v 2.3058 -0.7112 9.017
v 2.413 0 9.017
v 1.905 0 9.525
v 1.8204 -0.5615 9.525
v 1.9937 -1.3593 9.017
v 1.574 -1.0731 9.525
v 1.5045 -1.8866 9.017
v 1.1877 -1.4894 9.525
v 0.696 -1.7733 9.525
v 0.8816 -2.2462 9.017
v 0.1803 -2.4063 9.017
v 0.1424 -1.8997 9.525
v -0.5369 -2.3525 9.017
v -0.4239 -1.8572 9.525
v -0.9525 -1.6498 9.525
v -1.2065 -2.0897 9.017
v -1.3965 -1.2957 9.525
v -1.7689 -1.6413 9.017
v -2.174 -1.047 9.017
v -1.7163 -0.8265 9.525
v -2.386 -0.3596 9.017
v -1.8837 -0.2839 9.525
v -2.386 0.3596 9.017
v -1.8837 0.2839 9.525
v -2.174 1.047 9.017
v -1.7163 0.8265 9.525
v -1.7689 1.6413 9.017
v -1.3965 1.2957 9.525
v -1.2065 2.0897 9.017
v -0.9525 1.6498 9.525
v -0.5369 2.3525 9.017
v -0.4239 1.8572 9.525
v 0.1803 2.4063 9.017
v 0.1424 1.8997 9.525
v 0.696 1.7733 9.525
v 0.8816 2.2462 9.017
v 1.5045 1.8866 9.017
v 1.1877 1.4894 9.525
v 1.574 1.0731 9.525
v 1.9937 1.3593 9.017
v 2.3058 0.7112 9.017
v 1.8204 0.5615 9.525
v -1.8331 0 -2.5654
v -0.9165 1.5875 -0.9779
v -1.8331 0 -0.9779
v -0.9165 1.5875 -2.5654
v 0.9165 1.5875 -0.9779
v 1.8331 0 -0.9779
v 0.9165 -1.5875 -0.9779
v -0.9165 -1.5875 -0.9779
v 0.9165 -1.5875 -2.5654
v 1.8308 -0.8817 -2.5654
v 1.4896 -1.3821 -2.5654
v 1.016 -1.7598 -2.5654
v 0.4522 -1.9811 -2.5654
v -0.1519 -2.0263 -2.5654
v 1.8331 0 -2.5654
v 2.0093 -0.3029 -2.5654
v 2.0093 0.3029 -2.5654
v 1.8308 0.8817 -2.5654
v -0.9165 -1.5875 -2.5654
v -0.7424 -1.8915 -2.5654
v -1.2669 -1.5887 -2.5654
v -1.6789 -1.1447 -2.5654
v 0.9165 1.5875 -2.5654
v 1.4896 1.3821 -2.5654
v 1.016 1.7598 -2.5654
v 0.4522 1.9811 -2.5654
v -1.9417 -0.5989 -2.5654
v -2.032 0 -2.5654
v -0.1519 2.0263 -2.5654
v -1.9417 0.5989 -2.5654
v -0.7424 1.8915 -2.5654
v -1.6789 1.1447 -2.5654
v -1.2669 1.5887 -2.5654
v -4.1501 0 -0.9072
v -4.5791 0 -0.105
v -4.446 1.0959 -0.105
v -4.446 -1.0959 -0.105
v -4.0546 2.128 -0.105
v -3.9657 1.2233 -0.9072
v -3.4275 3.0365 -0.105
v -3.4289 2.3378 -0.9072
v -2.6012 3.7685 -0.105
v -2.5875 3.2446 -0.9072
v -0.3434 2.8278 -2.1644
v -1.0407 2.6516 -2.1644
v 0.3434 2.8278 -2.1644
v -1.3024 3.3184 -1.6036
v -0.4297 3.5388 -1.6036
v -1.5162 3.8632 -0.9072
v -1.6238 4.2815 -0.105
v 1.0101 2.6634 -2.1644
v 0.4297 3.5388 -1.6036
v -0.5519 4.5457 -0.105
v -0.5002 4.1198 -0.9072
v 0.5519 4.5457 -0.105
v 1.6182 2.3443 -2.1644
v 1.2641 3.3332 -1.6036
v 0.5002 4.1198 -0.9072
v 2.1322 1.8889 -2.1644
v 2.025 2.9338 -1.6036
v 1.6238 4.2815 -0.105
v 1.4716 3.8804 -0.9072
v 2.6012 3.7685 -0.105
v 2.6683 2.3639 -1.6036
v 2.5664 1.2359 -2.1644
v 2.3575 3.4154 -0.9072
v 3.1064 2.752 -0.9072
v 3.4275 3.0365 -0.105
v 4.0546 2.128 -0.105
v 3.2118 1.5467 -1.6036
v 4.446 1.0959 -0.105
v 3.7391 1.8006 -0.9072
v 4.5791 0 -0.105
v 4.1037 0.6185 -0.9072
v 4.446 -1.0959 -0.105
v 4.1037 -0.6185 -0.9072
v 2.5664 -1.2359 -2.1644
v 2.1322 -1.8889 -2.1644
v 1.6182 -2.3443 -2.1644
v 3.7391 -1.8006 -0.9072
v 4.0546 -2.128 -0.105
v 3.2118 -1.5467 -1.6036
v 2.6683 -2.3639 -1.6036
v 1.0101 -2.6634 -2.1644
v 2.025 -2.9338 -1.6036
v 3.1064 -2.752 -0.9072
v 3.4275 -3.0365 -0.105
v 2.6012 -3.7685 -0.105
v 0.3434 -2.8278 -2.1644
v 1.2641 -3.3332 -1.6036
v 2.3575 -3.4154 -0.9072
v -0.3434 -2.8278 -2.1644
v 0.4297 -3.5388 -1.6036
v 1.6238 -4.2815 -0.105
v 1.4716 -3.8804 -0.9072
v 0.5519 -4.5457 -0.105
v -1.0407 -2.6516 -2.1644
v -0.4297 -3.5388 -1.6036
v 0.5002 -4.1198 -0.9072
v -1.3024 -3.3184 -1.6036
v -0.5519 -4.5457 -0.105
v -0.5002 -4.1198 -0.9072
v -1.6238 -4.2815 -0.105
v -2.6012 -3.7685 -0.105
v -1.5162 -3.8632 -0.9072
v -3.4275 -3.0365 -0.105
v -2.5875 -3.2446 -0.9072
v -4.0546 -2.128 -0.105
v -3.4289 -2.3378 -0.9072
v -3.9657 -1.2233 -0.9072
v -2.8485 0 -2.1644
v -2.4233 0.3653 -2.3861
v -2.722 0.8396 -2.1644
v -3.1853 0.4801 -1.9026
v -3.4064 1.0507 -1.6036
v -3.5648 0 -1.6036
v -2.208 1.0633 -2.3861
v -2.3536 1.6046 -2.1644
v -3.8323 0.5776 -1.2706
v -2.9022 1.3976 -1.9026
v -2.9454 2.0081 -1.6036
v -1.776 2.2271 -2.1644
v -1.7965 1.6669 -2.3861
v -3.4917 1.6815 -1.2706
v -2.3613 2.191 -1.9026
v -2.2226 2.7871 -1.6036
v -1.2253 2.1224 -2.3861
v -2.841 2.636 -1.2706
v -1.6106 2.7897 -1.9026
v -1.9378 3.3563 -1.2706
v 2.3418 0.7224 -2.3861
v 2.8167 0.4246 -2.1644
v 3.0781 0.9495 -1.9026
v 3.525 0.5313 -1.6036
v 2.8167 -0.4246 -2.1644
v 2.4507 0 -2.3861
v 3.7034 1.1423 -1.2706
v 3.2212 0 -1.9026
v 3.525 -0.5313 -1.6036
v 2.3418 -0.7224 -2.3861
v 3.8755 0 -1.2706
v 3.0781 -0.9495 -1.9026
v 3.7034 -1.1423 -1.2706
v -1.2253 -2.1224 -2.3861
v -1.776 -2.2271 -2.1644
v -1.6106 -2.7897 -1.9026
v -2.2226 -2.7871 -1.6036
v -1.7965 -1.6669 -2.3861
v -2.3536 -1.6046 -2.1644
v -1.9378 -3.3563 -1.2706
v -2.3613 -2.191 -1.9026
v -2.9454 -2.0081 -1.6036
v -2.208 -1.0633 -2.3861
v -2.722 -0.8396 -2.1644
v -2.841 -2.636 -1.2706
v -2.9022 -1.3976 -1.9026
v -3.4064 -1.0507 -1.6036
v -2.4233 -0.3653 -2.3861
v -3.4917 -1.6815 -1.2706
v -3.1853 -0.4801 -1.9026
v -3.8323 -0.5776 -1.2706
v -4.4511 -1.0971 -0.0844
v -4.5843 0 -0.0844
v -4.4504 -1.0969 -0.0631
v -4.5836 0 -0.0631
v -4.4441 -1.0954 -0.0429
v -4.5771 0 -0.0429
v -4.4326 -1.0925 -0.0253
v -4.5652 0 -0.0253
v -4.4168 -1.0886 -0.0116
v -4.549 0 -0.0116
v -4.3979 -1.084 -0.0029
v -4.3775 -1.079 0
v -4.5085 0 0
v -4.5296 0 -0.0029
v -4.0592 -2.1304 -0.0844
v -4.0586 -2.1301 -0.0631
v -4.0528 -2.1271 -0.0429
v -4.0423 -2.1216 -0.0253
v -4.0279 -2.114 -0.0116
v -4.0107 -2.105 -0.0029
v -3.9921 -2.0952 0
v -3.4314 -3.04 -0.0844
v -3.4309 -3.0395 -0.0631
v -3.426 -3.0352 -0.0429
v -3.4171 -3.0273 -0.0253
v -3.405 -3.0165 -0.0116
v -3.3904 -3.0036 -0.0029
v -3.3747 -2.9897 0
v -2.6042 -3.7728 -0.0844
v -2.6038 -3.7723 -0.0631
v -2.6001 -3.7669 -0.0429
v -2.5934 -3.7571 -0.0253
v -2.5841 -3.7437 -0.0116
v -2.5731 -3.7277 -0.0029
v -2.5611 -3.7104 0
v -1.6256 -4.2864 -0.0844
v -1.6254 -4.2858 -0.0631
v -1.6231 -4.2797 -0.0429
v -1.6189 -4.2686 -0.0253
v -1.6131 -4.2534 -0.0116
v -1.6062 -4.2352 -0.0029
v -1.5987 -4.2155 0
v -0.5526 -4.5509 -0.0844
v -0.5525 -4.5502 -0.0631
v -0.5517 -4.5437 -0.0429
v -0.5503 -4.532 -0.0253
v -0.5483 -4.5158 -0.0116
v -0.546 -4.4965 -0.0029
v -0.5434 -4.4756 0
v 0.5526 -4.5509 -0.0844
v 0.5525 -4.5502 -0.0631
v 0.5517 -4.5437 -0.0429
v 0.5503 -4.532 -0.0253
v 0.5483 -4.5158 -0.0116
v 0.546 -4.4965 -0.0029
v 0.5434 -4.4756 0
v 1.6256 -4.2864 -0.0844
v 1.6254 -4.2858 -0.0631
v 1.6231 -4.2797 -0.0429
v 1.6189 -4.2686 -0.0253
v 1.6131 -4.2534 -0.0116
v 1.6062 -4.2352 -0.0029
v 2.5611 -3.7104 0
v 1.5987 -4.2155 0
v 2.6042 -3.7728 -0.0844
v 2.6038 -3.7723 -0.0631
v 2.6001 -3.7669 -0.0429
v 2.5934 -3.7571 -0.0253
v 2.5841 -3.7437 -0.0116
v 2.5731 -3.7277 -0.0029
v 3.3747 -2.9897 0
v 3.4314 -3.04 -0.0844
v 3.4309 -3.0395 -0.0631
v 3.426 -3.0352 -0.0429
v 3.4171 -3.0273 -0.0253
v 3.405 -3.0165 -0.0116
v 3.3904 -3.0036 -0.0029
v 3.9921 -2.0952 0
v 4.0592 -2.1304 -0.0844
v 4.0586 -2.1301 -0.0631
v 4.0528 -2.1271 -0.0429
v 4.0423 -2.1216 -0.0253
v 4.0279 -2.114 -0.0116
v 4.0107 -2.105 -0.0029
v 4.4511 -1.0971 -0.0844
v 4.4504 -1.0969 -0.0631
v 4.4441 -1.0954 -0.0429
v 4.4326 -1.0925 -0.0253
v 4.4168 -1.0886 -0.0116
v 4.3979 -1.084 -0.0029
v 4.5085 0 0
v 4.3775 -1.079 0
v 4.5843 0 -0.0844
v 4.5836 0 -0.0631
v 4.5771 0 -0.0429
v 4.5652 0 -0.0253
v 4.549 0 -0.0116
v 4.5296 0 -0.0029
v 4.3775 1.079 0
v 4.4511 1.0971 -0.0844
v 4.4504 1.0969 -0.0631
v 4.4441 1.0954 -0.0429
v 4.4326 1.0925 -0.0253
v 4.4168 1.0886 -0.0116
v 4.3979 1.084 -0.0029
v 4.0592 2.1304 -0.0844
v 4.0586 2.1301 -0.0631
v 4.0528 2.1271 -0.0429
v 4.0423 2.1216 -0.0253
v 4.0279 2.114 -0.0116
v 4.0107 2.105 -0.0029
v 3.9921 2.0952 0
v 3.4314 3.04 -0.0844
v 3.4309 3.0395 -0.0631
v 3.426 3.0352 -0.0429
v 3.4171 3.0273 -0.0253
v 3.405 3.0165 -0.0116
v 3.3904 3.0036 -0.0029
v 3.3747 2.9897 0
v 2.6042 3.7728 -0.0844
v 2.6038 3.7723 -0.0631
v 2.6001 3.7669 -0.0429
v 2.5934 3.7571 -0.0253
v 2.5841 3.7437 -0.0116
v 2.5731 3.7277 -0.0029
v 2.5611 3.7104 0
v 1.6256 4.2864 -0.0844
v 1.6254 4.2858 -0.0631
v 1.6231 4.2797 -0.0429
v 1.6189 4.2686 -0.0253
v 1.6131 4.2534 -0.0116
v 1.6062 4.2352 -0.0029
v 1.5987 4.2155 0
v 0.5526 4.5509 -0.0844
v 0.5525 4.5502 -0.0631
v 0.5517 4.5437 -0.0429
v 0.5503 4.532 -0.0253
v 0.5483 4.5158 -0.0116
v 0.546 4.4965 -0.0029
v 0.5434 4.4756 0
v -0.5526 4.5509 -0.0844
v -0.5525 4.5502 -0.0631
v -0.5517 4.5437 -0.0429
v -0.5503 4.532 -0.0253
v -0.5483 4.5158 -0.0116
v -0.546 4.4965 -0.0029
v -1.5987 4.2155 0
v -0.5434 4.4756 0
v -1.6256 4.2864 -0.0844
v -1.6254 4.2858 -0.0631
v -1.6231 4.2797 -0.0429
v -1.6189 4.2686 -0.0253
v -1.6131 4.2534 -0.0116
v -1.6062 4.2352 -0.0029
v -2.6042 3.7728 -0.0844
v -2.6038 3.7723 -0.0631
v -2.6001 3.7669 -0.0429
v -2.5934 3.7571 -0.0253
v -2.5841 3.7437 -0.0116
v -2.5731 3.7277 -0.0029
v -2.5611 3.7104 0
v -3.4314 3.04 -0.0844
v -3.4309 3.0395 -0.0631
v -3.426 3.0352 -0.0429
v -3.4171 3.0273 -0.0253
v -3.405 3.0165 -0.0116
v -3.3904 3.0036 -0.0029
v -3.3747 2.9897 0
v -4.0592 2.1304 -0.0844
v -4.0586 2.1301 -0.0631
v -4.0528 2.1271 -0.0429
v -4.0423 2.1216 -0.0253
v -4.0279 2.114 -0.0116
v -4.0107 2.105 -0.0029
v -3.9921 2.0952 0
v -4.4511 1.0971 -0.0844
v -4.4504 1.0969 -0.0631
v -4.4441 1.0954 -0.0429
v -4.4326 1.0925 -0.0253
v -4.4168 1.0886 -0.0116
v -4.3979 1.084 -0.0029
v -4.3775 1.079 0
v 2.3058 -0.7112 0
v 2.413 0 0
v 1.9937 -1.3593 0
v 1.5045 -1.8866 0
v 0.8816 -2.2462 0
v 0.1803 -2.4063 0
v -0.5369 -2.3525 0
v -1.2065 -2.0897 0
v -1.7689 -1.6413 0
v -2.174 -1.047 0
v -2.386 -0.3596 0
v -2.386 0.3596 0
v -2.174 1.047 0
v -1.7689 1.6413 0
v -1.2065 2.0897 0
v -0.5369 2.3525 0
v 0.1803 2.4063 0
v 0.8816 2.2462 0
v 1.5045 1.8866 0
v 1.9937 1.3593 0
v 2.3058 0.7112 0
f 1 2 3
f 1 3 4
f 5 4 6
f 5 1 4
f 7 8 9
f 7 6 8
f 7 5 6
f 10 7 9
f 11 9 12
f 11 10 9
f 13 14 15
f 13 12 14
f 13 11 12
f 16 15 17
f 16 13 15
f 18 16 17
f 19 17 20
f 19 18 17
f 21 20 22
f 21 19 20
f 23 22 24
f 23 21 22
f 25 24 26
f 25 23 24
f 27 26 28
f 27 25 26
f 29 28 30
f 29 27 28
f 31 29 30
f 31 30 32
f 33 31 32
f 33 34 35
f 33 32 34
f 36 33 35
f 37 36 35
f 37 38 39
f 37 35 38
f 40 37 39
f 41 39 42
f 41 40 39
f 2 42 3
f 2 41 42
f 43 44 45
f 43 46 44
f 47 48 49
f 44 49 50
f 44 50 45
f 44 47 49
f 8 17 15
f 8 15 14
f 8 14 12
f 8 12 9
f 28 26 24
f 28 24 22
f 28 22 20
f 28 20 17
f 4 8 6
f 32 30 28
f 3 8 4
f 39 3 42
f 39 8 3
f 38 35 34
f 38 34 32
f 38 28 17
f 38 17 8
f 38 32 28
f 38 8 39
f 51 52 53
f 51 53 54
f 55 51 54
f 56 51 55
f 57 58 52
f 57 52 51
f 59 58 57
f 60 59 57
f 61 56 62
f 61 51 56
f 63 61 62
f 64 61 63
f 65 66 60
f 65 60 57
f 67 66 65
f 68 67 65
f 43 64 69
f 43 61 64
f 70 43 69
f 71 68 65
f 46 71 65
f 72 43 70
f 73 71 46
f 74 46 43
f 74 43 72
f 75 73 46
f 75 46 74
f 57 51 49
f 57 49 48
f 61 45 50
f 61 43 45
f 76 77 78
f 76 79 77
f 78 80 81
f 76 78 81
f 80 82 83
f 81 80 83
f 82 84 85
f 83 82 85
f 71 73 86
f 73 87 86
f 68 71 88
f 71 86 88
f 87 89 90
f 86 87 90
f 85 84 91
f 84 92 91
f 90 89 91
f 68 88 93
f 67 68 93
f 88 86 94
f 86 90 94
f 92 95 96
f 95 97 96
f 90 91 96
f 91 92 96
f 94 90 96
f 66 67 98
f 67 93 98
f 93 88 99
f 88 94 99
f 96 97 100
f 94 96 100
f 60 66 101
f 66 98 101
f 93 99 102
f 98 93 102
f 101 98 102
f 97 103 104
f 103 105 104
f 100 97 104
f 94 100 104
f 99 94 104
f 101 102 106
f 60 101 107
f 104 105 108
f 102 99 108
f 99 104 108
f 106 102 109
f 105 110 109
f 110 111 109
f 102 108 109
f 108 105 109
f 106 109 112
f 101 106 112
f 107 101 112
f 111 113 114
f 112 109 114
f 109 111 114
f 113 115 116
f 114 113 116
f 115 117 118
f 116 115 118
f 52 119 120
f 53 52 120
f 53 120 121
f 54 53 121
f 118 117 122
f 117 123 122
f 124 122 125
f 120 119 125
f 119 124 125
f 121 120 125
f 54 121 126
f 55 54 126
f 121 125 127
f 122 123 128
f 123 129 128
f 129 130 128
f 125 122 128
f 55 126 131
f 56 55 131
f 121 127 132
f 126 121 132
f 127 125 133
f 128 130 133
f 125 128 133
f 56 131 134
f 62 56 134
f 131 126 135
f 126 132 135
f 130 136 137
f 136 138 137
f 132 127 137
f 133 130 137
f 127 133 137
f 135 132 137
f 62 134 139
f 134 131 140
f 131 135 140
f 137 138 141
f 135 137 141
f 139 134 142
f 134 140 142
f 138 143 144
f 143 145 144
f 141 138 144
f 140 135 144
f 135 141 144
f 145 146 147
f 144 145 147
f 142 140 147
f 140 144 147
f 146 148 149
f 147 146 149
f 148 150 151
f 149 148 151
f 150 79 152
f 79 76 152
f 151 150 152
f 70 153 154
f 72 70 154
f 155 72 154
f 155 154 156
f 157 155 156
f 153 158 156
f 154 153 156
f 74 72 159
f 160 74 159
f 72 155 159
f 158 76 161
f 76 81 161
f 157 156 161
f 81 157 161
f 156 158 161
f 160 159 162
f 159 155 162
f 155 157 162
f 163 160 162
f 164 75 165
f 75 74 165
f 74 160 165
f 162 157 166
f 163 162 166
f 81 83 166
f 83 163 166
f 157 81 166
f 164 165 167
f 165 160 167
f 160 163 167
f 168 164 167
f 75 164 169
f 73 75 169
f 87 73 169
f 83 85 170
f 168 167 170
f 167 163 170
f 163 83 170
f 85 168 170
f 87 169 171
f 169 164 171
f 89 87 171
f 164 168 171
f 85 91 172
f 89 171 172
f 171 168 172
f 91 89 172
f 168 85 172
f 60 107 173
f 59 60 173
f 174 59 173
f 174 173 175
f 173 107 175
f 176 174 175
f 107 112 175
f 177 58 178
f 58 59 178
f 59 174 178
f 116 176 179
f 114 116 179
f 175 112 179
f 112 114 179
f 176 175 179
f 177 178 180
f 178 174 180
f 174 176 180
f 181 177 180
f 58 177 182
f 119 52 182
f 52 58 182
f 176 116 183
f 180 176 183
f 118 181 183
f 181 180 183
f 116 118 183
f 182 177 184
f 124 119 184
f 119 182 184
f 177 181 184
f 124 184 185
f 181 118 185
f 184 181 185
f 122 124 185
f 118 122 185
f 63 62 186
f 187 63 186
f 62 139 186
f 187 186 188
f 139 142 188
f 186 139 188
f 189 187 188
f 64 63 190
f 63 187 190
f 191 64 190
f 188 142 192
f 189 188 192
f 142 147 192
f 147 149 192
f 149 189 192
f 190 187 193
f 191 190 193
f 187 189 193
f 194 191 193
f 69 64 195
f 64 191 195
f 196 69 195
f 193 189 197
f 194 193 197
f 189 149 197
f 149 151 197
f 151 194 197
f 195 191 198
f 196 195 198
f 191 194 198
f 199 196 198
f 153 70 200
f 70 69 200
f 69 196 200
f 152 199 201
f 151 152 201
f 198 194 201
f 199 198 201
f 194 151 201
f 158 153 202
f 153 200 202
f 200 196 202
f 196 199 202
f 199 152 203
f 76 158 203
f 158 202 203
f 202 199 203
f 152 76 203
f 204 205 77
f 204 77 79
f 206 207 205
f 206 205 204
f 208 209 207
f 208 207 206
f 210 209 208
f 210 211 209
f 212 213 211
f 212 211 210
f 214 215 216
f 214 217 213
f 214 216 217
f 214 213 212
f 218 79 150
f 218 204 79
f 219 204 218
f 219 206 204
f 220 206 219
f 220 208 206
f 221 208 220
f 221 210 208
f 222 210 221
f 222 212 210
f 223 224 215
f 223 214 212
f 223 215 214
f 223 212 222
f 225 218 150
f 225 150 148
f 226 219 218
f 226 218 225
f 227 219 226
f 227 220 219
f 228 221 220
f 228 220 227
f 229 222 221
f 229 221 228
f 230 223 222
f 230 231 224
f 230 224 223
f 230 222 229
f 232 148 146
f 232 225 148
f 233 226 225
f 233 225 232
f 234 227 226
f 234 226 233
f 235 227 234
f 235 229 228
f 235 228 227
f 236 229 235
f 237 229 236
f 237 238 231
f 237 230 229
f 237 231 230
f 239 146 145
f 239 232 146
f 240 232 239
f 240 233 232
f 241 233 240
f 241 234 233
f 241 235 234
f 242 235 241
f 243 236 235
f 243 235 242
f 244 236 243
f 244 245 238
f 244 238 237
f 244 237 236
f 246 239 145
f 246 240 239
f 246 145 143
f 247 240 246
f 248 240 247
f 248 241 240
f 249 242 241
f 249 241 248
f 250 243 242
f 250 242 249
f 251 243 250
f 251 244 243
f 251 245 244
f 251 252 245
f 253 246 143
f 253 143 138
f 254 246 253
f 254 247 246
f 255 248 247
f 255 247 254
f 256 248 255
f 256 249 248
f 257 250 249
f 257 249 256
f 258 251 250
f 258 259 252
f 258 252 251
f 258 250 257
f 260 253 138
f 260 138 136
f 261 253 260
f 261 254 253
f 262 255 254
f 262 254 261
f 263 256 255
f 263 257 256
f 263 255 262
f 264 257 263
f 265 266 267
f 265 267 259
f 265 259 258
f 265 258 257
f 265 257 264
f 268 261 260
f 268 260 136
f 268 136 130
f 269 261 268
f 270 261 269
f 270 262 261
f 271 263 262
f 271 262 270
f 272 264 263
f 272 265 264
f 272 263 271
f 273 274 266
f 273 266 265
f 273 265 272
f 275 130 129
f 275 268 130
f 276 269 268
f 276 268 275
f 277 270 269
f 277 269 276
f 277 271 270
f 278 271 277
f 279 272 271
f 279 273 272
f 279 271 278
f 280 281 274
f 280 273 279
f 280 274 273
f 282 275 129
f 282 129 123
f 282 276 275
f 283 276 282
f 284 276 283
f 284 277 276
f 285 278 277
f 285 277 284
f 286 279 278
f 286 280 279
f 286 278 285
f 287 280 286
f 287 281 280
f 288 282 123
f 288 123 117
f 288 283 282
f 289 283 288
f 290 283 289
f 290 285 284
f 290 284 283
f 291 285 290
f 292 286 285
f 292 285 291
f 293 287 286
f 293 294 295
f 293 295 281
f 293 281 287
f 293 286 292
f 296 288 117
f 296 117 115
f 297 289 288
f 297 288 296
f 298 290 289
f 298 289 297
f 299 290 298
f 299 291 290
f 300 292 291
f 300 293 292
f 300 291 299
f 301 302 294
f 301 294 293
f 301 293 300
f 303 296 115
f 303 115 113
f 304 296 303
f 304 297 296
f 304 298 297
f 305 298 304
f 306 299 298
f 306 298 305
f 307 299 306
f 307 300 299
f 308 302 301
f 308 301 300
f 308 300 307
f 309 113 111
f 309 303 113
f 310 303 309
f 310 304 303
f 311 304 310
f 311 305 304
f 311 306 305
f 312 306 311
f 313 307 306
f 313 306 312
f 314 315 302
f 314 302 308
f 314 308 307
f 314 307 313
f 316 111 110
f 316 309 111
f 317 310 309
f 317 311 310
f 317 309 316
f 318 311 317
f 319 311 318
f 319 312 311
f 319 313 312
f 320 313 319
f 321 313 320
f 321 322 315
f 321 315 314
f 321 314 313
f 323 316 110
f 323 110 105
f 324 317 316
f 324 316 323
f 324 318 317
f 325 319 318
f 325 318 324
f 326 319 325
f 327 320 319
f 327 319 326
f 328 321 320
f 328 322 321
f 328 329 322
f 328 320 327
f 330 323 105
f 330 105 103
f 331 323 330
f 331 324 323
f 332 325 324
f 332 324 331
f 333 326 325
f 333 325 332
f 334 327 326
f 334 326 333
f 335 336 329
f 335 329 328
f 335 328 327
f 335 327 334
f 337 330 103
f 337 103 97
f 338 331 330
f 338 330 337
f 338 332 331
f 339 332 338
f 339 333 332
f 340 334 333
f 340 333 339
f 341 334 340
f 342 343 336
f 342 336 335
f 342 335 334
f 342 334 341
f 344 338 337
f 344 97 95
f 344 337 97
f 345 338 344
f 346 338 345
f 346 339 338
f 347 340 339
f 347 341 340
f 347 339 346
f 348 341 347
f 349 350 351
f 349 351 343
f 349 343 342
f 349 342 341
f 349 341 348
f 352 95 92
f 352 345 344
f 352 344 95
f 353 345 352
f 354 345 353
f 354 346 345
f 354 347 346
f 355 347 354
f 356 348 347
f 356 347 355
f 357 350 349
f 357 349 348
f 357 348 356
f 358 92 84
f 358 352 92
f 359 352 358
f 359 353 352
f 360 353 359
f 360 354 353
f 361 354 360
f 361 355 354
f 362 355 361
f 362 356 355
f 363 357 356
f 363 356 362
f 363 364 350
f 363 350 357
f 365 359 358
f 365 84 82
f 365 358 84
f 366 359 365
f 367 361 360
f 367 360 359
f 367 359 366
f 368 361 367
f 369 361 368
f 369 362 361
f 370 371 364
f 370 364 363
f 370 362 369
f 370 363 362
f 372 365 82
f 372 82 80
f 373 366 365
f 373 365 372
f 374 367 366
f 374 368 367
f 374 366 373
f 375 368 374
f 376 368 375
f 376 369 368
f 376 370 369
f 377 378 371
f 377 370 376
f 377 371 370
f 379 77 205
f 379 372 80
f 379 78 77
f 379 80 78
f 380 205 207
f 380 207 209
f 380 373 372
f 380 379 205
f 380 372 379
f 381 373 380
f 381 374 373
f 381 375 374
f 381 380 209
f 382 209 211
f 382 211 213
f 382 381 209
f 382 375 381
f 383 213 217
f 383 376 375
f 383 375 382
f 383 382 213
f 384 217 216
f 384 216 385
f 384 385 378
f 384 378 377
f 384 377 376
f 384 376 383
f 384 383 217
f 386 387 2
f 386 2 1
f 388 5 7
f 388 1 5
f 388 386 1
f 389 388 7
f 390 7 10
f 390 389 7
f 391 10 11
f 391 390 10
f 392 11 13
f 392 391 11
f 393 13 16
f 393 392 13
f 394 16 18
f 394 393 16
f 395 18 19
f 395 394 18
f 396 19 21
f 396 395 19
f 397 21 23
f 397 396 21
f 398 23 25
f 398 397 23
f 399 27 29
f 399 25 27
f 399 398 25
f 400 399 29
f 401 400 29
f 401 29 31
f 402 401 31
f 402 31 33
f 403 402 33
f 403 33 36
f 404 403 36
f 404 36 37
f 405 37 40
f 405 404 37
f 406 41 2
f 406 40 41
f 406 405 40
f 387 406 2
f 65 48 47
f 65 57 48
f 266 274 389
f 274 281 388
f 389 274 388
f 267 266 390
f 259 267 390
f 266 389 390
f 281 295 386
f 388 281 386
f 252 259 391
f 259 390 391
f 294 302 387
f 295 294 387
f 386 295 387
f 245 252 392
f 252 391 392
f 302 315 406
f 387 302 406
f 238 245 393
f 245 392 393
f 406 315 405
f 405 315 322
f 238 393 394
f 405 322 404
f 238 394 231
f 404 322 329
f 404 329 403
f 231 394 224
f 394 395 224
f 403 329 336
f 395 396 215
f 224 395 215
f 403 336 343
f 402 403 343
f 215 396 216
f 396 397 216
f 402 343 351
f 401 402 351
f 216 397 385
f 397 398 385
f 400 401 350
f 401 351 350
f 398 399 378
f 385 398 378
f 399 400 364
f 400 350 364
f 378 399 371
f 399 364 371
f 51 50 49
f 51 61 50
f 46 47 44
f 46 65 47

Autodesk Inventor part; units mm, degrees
ref_plane "YZ Plane" through (0, 0, 0) normal (1, 0, 0) x (0, 1, 0)
ref_plane "XZ Plane" through (0, 0, 0) normal (0, 1, 0) x (-1, 0, 0)
ref_plane "XY Plane" through (0, 0, 0) normal (0, 0, 1) x (1, 0, 0)
sketch "Sketch1" plane through (0, 0, 0) normal (0, 0, 1) x (1, 0, 0)
  circle A0 centre (0, 0) radius 2.413
  dimension "d0" = 4.826
extrude "Extrusion1" add sketch "Sketch1" along normal blind 9.525
sketch "Sketch2" plane through (0, 0, 0) normal (0, 1, 0) x (-1, 0, 0)
  line L0 (0, 0) -> (0, -2.5654)
  line L1 (0, 0) -> (4.5085, 0)
  line L2 (0, -2.5654) -> (2.032, -2.5654)
  line L3 (4.5085, 0) -> (4.5085, 4.071) construction
  arc A0 (4.5791, -0.105) -> (4.5085, 0) centre (4.5085, -0.0762) ccw
  arc A1 (2.032, -2.5654) -> (4.5791, -0.105) centre (0.5168, 1.5517) ccw
  line L4 (4.5847, 0.6553) -> (4.5847, -0.0762) construction
  dimension "d3" = 2.5654
  dimension "d6" = 2.032
  dimension "d12" = 4.5847
  dimension "d18" = 0.0762
revolve "Revolution1" add sketch "Sketch2" angle 360 about axis through (0, 0, 0) along (0, 0, -1)
sketch "Sketch3" plane through (0, 0, -2.5654) normal (0, 0, -1) x (-1, 0, 0)
  circle A0 centre (0, 0) radius 2.032 projected
  line L0 (-0.9165, 1.5875) -> (0.9165, 1.5875)
  line L1 (0.9165, 1.5875) -> (1.8331, 0)
  line L2 (1.8331, 0) -> (0.9165, -1.5875)
  line L3 (0.9165, -1.5875) -> (-0.9165, -1.5875)
  line L4 (-0.9165, -1.5875) -> (-1.8331, 0)
  line L5 (-1.8331, 0) -> (-0.9165, 1.5875)
  dimension "d8" = 3.175
extrude "Extrusion2" cut sketch "Sketch3" against normal blind 1.5875 contours L0 L1 L2 L3 L4 L5
chamfer "Chamfer1" distance 0.508 angle 45 1 edges at (-2.413, 0, 9.525)
thread "Thread1" size "10-32 UNF" class "2A" standard "ANSI Unified Screw Threads" full length
properties part number "10-32 BHCS x375" material "Steel"
